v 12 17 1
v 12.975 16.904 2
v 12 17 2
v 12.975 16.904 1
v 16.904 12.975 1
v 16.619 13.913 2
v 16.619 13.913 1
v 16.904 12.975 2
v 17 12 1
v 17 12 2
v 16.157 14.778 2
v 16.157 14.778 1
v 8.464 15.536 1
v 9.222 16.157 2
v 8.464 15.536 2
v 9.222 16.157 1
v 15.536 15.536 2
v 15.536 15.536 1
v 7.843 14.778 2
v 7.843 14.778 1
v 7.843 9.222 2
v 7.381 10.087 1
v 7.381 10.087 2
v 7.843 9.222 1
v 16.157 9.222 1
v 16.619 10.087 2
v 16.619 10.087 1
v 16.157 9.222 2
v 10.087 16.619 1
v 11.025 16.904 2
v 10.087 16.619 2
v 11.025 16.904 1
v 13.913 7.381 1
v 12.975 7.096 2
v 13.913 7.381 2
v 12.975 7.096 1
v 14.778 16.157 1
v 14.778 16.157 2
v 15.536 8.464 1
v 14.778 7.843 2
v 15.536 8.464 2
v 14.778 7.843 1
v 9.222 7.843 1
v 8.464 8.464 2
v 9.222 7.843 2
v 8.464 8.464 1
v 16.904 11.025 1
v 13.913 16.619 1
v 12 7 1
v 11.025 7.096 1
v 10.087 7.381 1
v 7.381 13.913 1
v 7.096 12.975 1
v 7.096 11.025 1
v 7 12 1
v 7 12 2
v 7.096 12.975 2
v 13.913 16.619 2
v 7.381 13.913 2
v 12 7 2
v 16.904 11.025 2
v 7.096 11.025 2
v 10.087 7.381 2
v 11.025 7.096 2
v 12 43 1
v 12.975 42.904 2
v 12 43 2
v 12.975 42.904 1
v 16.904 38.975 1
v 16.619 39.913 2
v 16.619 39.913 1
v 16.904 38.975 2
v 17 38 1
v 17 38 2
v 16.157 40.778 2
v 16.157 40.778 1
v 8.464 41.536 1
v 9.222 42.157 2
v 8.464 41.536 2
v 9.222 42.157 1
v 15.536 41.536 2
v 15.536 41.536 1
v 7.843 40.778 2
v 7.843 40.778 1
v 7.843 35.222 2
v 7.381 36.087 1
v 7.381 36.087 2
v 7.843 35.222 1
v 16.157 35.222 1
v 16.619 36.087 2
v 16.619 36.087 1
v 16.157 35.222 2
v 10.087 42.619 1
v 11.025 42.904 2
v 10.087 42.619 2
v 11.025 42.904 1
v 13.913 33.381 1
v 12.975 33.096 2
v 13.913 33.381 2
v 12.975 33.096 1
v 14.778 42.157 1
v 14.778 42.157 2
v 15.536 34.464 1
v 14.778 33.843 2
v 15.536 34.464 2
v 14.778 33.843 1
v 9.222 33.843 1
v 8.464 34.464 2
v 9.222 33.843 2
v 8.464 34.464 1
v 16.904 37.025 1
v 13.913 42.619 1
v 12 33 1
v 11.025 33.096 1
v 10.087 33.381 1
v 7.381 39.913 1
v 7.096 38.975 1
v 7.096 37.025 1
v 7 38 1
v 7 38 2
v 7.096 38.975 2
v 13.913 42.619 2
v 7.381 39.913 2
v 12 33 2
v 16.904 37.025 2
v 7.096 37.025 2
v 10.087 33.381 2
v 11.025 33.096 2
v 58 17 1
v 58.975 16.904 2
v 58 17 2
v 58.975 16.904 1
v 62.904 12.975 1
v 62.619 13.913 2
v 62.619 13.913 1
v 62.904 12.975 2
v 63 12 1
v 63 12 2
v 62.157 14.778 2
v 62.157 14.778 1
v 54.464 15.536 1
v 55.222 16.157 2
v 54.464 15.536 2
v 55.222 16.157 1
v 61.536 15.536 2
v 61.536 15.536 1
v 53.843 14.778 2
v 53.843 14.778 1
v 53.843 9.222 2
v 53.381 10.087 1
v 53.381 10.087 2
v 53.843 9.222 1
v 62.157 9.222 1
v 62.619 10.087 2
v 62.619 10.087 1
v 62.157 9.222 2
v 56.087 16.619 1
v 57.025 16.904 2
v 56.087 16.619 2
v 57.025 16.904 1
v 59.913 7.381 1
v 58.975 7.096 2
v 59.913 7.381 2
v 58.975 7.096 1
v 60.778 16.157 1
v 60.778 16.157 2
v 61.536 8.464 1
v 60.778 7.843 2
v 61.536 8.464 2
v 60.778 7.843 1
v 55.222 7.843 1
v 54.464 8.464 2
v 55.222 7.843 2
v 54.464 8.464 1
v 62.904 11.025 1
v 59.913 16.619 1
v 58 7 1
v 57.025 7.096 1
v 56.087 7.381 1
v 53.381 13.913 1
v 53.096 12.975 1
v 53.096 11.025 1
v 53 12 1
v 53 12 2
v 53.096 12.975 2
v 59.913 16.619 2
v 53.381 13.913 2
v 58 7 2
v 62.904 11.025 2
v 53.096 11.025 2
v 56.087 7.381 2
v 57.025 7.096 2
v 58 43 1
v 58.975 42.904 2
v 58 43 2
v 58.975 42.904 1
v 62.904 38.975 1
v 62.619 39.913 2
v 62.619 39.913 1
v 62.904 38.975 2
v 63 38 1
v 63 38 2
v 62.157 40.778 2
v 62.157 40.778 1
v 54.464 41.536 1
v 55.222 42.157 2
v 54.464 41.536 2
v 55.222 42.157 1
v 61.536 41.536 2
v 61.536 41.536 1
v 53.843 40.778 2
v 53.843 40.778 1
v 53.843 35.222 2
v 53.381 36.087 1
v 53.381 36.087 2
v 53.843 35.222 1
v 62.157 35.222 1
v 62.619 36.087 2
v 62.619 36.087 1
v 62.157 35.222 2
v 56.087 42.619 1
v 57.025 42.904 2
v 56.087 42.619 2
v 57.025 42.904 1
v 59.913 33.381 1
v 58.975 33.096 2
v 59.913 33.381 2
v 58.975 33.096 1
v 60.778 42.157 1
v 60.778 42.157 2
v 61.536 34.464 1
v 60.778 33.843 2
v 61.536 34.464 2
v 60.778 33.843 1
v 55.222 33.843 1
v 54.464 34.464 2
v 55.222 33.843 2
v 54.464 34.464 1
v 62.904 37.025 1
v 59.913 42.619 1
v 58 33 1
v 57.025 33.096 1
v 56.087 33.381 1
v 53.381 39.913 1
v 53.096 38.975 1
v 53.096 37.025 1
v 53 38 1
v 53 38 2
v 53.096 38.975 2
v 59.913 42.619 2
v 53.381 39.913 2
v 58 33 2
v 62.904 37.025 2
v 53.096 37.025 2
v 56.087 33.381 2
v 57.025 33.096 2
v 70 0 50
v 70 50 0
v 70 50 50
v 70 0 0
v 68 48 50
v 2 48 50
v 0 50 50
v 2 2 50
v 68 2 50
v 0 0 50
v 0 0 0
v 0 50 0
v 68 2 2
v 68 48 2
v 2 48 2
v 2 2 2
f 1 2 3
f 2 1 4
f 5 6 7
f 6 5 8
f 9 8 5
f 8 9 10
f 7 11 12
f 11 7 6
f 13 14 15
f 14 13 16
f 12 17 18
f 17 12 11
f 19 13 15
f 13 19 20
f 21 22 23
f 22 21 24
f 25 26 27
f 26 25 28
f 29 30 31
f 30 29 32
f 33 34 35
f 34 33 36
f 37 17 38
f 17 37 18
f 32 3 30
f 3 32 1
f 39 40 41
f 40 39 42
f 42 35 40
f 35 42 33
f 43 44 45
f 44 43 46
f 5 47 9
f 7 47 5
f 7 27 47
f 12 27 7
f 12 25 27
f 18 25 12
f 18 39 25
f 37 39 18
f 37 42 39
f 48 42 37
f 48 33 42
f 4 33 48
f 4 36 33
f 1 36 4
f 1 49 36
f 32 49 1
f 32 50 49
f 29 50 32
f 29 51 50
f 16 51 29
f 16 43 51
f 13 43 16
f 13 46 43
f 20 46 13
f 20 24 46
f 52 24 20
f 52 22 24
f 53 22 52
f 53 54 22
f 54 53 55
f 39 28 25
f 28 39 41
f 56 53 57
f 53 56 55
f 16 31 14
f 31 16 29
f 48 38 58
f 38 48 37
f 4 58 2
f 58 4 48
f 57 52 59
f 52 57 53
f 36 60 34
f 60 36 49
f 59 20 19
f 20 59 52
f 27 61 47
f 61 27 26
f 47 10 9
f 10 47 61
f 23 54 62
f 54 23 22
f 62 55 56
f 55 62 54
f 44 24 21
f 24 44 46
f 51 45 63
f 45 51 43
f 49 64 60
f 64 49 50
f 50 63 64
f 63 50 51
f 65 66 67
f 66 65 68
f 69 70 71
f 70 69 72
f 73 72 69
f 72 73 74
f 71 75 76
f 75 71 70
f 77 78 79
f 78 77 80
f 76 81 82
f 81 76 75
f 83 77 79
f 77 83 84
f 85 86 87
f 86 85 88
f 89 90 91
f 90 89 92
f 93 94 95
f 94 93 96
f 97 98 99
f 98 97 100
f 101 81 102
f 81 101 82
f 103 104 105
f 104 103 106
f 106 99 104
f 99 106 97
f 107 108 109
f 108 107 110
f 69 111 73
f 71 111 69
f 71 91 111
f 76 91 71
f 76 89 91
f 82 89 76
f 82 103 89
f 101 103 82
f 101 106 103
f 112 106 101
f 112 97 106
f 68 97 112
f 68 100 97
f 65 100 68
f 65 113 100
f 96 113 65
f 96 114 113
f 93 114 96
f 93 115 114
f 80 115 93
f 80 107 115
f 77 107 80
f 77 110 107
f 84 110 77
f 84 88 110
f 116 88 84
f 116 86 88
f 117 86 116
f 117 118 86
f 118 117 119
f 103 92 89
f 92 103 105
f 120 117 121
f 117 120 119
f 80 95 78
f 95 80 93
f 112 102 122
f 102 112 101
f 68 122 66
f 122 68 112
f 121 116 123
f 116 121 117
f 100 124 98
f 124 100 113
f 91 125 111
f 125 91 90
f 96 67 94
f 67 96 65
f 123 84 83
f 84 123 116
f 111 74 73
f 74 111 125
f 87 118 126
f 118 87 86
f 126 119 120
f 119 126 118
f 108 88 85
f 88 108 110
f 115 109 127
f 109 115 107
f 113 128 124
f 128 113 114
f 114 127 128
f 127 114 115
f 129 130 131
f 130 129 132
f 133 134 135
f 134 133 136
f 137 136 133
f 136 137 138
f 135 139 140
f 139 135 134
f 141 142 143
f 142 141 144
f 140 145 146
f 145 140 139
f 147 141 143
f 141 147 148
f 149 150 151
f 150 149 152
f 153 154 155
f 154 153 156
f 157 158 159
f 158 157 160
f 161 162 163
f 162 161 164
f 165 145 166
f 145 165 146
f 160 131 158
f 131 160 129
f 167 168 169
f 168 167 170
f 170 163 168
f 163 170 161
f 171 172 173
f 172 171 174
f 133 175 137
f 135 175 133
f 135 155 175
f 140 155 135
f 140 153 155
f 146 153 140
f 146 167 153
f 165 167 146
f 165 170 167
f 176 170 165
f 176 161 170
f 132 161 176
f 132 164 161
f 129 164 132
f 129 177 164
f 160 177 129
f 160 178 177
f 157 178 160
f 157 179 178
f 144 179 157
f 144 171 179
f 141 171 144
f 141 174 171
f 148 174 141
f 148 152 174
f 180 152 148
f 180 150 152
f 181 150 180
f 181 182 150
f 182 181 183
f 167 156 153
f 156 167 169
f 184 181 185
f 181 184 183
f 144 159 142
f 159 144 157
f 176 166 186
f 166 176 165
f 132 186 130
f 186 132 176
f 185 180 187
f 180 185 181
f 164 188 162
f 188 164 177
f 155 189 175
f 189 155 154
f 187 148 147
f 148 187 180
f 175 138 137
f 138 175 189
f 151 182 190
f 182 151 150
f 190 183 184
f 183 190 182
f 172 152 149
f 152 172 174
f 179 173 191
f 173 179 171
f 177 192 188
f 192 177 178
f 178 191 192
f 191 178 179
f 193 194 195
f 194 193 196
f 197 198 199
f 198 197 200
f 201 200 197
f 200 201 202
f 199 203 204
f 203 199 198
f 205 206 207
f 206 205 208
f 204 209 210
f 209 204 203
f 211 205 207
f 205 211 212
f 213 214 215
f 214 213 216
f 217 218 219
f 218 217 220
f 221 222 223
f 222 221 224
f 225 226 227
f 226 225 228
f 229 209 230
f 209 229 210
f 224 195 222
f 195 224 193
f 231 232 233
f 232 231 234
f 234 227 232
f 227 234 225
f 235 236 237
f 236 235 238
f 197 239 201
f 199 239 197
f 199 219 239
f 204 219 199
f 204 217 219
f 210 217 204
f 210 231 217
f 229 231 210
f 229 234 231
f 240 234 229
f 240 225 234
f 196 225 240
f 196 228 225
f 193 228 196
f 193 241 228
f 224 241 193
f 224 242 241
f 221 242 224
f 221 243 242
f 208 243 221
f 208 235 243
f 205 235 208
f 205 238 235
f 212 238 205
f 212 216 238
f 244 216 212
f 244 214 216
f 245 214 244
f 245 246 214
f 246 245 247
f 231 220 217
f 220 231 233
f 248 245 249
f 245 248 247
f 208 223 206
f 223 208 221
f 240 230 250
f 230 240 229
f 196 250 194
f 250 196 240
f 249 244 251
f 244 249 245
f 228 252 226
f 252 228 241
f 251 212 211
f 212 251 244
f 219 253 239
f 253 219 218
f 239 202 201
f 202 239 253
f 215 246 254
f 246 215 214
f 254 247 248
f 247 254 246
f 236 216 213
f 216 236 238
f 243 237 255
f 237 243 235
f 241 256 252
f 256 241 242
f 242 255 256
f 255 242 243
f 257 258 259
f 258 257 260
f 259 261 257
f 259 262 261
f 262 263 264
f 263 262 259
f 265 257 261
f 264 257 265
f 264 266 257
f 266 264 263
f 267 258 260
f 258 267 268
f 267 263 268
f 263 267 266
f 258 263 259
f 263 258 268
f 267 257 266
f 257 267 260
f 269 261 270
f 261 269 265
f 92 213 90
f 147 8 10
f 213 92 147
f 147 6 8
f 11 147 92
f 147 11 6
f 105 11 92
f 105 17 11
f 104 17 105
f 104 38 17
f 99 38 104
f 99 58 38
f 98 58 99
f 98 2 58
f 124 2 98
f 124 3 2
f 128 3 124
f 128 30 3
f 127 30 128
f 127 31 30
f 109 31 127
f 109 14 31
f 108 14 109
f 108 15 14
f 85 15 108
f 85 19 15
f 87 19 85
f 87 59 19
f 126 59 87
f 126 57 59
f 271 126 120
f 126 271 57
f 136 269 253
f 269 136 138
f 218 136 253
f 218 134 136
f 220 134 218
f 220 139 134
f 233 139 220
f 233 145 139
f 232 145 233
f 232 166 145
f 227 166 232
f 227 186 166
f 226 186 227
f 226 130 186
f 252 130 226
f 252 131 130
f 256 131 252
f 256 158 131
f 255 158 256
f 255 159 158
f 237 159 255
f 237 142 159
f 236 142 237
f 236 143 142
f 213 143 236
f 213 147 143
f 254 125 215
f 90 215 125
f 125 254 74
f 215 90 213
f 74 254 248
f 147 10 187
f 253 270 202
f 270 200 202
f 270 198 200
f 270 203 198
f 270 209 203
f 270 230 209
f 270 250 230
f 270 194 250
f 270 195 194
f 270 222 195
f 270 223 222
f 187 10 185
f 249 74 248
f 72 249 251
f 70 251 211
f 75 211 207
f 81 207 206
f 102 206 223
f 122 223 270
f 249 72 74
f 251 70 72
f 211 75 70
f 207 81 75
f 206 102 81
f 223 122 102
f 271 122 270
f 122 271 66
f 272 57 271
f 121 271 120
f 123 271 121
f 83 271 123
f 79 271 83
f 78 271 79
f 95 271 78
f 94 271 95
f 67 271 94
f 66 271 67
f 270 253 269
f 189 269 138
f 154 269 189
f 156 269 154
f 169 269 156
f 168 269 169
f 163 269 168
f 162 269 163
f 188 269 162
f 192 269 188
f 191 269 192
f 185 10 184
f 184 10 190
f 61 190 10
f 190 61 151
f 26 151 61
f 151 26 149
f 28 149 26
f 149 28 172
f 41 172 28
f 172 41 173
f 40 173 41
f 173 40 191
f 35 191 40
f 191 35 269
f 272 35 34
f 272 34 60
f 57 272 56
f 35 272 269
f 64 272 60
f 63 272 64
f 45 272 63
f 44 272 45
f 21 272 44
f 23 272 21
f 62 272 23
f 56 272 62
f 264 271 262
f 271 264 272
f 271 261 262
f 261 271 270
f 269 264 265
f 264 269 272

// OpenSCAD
$fn = 32;

// ----------------------------------------------------------------------
// Enclosure box: bosses enclosure
// ----------------------------------------------------------------------

// --- parameters (mm) ---
box_l = 70;               // outer length, X
box_w = 50;               // outer width, Y
box_h = 50;               // outer height
wall_t = 2;               // wall thickness
boss_r = 5;               // corner boss radius
hole_r = 2;               // boss screw hole radius
boss_in = 12;             // boss inset from the corners

inner_h = box_h - wall_t;  // cavity depth
boss_h = inner_h - 2;  // corner boss height

difference() {
  cube([box_l, box_w, box_h]);
  translate([wall_t, wall_t, wall_t])
    cube([box_l - 2 * wall_t, box_w - 2 * wall_t, box_h]);
  for (sx = [0, 1], sy = [0, 1])
    translate([sx ? box_l - boss_in : boss_in,
               sy ? box_w - boss_in : boss_in, wall_t - 1]) {
      cylinder(r = boss_r, h = boss_h);
      translate([0, 0, boss_h - 4])
        cylinder(r = hole_r, h = 5);
    }
}
